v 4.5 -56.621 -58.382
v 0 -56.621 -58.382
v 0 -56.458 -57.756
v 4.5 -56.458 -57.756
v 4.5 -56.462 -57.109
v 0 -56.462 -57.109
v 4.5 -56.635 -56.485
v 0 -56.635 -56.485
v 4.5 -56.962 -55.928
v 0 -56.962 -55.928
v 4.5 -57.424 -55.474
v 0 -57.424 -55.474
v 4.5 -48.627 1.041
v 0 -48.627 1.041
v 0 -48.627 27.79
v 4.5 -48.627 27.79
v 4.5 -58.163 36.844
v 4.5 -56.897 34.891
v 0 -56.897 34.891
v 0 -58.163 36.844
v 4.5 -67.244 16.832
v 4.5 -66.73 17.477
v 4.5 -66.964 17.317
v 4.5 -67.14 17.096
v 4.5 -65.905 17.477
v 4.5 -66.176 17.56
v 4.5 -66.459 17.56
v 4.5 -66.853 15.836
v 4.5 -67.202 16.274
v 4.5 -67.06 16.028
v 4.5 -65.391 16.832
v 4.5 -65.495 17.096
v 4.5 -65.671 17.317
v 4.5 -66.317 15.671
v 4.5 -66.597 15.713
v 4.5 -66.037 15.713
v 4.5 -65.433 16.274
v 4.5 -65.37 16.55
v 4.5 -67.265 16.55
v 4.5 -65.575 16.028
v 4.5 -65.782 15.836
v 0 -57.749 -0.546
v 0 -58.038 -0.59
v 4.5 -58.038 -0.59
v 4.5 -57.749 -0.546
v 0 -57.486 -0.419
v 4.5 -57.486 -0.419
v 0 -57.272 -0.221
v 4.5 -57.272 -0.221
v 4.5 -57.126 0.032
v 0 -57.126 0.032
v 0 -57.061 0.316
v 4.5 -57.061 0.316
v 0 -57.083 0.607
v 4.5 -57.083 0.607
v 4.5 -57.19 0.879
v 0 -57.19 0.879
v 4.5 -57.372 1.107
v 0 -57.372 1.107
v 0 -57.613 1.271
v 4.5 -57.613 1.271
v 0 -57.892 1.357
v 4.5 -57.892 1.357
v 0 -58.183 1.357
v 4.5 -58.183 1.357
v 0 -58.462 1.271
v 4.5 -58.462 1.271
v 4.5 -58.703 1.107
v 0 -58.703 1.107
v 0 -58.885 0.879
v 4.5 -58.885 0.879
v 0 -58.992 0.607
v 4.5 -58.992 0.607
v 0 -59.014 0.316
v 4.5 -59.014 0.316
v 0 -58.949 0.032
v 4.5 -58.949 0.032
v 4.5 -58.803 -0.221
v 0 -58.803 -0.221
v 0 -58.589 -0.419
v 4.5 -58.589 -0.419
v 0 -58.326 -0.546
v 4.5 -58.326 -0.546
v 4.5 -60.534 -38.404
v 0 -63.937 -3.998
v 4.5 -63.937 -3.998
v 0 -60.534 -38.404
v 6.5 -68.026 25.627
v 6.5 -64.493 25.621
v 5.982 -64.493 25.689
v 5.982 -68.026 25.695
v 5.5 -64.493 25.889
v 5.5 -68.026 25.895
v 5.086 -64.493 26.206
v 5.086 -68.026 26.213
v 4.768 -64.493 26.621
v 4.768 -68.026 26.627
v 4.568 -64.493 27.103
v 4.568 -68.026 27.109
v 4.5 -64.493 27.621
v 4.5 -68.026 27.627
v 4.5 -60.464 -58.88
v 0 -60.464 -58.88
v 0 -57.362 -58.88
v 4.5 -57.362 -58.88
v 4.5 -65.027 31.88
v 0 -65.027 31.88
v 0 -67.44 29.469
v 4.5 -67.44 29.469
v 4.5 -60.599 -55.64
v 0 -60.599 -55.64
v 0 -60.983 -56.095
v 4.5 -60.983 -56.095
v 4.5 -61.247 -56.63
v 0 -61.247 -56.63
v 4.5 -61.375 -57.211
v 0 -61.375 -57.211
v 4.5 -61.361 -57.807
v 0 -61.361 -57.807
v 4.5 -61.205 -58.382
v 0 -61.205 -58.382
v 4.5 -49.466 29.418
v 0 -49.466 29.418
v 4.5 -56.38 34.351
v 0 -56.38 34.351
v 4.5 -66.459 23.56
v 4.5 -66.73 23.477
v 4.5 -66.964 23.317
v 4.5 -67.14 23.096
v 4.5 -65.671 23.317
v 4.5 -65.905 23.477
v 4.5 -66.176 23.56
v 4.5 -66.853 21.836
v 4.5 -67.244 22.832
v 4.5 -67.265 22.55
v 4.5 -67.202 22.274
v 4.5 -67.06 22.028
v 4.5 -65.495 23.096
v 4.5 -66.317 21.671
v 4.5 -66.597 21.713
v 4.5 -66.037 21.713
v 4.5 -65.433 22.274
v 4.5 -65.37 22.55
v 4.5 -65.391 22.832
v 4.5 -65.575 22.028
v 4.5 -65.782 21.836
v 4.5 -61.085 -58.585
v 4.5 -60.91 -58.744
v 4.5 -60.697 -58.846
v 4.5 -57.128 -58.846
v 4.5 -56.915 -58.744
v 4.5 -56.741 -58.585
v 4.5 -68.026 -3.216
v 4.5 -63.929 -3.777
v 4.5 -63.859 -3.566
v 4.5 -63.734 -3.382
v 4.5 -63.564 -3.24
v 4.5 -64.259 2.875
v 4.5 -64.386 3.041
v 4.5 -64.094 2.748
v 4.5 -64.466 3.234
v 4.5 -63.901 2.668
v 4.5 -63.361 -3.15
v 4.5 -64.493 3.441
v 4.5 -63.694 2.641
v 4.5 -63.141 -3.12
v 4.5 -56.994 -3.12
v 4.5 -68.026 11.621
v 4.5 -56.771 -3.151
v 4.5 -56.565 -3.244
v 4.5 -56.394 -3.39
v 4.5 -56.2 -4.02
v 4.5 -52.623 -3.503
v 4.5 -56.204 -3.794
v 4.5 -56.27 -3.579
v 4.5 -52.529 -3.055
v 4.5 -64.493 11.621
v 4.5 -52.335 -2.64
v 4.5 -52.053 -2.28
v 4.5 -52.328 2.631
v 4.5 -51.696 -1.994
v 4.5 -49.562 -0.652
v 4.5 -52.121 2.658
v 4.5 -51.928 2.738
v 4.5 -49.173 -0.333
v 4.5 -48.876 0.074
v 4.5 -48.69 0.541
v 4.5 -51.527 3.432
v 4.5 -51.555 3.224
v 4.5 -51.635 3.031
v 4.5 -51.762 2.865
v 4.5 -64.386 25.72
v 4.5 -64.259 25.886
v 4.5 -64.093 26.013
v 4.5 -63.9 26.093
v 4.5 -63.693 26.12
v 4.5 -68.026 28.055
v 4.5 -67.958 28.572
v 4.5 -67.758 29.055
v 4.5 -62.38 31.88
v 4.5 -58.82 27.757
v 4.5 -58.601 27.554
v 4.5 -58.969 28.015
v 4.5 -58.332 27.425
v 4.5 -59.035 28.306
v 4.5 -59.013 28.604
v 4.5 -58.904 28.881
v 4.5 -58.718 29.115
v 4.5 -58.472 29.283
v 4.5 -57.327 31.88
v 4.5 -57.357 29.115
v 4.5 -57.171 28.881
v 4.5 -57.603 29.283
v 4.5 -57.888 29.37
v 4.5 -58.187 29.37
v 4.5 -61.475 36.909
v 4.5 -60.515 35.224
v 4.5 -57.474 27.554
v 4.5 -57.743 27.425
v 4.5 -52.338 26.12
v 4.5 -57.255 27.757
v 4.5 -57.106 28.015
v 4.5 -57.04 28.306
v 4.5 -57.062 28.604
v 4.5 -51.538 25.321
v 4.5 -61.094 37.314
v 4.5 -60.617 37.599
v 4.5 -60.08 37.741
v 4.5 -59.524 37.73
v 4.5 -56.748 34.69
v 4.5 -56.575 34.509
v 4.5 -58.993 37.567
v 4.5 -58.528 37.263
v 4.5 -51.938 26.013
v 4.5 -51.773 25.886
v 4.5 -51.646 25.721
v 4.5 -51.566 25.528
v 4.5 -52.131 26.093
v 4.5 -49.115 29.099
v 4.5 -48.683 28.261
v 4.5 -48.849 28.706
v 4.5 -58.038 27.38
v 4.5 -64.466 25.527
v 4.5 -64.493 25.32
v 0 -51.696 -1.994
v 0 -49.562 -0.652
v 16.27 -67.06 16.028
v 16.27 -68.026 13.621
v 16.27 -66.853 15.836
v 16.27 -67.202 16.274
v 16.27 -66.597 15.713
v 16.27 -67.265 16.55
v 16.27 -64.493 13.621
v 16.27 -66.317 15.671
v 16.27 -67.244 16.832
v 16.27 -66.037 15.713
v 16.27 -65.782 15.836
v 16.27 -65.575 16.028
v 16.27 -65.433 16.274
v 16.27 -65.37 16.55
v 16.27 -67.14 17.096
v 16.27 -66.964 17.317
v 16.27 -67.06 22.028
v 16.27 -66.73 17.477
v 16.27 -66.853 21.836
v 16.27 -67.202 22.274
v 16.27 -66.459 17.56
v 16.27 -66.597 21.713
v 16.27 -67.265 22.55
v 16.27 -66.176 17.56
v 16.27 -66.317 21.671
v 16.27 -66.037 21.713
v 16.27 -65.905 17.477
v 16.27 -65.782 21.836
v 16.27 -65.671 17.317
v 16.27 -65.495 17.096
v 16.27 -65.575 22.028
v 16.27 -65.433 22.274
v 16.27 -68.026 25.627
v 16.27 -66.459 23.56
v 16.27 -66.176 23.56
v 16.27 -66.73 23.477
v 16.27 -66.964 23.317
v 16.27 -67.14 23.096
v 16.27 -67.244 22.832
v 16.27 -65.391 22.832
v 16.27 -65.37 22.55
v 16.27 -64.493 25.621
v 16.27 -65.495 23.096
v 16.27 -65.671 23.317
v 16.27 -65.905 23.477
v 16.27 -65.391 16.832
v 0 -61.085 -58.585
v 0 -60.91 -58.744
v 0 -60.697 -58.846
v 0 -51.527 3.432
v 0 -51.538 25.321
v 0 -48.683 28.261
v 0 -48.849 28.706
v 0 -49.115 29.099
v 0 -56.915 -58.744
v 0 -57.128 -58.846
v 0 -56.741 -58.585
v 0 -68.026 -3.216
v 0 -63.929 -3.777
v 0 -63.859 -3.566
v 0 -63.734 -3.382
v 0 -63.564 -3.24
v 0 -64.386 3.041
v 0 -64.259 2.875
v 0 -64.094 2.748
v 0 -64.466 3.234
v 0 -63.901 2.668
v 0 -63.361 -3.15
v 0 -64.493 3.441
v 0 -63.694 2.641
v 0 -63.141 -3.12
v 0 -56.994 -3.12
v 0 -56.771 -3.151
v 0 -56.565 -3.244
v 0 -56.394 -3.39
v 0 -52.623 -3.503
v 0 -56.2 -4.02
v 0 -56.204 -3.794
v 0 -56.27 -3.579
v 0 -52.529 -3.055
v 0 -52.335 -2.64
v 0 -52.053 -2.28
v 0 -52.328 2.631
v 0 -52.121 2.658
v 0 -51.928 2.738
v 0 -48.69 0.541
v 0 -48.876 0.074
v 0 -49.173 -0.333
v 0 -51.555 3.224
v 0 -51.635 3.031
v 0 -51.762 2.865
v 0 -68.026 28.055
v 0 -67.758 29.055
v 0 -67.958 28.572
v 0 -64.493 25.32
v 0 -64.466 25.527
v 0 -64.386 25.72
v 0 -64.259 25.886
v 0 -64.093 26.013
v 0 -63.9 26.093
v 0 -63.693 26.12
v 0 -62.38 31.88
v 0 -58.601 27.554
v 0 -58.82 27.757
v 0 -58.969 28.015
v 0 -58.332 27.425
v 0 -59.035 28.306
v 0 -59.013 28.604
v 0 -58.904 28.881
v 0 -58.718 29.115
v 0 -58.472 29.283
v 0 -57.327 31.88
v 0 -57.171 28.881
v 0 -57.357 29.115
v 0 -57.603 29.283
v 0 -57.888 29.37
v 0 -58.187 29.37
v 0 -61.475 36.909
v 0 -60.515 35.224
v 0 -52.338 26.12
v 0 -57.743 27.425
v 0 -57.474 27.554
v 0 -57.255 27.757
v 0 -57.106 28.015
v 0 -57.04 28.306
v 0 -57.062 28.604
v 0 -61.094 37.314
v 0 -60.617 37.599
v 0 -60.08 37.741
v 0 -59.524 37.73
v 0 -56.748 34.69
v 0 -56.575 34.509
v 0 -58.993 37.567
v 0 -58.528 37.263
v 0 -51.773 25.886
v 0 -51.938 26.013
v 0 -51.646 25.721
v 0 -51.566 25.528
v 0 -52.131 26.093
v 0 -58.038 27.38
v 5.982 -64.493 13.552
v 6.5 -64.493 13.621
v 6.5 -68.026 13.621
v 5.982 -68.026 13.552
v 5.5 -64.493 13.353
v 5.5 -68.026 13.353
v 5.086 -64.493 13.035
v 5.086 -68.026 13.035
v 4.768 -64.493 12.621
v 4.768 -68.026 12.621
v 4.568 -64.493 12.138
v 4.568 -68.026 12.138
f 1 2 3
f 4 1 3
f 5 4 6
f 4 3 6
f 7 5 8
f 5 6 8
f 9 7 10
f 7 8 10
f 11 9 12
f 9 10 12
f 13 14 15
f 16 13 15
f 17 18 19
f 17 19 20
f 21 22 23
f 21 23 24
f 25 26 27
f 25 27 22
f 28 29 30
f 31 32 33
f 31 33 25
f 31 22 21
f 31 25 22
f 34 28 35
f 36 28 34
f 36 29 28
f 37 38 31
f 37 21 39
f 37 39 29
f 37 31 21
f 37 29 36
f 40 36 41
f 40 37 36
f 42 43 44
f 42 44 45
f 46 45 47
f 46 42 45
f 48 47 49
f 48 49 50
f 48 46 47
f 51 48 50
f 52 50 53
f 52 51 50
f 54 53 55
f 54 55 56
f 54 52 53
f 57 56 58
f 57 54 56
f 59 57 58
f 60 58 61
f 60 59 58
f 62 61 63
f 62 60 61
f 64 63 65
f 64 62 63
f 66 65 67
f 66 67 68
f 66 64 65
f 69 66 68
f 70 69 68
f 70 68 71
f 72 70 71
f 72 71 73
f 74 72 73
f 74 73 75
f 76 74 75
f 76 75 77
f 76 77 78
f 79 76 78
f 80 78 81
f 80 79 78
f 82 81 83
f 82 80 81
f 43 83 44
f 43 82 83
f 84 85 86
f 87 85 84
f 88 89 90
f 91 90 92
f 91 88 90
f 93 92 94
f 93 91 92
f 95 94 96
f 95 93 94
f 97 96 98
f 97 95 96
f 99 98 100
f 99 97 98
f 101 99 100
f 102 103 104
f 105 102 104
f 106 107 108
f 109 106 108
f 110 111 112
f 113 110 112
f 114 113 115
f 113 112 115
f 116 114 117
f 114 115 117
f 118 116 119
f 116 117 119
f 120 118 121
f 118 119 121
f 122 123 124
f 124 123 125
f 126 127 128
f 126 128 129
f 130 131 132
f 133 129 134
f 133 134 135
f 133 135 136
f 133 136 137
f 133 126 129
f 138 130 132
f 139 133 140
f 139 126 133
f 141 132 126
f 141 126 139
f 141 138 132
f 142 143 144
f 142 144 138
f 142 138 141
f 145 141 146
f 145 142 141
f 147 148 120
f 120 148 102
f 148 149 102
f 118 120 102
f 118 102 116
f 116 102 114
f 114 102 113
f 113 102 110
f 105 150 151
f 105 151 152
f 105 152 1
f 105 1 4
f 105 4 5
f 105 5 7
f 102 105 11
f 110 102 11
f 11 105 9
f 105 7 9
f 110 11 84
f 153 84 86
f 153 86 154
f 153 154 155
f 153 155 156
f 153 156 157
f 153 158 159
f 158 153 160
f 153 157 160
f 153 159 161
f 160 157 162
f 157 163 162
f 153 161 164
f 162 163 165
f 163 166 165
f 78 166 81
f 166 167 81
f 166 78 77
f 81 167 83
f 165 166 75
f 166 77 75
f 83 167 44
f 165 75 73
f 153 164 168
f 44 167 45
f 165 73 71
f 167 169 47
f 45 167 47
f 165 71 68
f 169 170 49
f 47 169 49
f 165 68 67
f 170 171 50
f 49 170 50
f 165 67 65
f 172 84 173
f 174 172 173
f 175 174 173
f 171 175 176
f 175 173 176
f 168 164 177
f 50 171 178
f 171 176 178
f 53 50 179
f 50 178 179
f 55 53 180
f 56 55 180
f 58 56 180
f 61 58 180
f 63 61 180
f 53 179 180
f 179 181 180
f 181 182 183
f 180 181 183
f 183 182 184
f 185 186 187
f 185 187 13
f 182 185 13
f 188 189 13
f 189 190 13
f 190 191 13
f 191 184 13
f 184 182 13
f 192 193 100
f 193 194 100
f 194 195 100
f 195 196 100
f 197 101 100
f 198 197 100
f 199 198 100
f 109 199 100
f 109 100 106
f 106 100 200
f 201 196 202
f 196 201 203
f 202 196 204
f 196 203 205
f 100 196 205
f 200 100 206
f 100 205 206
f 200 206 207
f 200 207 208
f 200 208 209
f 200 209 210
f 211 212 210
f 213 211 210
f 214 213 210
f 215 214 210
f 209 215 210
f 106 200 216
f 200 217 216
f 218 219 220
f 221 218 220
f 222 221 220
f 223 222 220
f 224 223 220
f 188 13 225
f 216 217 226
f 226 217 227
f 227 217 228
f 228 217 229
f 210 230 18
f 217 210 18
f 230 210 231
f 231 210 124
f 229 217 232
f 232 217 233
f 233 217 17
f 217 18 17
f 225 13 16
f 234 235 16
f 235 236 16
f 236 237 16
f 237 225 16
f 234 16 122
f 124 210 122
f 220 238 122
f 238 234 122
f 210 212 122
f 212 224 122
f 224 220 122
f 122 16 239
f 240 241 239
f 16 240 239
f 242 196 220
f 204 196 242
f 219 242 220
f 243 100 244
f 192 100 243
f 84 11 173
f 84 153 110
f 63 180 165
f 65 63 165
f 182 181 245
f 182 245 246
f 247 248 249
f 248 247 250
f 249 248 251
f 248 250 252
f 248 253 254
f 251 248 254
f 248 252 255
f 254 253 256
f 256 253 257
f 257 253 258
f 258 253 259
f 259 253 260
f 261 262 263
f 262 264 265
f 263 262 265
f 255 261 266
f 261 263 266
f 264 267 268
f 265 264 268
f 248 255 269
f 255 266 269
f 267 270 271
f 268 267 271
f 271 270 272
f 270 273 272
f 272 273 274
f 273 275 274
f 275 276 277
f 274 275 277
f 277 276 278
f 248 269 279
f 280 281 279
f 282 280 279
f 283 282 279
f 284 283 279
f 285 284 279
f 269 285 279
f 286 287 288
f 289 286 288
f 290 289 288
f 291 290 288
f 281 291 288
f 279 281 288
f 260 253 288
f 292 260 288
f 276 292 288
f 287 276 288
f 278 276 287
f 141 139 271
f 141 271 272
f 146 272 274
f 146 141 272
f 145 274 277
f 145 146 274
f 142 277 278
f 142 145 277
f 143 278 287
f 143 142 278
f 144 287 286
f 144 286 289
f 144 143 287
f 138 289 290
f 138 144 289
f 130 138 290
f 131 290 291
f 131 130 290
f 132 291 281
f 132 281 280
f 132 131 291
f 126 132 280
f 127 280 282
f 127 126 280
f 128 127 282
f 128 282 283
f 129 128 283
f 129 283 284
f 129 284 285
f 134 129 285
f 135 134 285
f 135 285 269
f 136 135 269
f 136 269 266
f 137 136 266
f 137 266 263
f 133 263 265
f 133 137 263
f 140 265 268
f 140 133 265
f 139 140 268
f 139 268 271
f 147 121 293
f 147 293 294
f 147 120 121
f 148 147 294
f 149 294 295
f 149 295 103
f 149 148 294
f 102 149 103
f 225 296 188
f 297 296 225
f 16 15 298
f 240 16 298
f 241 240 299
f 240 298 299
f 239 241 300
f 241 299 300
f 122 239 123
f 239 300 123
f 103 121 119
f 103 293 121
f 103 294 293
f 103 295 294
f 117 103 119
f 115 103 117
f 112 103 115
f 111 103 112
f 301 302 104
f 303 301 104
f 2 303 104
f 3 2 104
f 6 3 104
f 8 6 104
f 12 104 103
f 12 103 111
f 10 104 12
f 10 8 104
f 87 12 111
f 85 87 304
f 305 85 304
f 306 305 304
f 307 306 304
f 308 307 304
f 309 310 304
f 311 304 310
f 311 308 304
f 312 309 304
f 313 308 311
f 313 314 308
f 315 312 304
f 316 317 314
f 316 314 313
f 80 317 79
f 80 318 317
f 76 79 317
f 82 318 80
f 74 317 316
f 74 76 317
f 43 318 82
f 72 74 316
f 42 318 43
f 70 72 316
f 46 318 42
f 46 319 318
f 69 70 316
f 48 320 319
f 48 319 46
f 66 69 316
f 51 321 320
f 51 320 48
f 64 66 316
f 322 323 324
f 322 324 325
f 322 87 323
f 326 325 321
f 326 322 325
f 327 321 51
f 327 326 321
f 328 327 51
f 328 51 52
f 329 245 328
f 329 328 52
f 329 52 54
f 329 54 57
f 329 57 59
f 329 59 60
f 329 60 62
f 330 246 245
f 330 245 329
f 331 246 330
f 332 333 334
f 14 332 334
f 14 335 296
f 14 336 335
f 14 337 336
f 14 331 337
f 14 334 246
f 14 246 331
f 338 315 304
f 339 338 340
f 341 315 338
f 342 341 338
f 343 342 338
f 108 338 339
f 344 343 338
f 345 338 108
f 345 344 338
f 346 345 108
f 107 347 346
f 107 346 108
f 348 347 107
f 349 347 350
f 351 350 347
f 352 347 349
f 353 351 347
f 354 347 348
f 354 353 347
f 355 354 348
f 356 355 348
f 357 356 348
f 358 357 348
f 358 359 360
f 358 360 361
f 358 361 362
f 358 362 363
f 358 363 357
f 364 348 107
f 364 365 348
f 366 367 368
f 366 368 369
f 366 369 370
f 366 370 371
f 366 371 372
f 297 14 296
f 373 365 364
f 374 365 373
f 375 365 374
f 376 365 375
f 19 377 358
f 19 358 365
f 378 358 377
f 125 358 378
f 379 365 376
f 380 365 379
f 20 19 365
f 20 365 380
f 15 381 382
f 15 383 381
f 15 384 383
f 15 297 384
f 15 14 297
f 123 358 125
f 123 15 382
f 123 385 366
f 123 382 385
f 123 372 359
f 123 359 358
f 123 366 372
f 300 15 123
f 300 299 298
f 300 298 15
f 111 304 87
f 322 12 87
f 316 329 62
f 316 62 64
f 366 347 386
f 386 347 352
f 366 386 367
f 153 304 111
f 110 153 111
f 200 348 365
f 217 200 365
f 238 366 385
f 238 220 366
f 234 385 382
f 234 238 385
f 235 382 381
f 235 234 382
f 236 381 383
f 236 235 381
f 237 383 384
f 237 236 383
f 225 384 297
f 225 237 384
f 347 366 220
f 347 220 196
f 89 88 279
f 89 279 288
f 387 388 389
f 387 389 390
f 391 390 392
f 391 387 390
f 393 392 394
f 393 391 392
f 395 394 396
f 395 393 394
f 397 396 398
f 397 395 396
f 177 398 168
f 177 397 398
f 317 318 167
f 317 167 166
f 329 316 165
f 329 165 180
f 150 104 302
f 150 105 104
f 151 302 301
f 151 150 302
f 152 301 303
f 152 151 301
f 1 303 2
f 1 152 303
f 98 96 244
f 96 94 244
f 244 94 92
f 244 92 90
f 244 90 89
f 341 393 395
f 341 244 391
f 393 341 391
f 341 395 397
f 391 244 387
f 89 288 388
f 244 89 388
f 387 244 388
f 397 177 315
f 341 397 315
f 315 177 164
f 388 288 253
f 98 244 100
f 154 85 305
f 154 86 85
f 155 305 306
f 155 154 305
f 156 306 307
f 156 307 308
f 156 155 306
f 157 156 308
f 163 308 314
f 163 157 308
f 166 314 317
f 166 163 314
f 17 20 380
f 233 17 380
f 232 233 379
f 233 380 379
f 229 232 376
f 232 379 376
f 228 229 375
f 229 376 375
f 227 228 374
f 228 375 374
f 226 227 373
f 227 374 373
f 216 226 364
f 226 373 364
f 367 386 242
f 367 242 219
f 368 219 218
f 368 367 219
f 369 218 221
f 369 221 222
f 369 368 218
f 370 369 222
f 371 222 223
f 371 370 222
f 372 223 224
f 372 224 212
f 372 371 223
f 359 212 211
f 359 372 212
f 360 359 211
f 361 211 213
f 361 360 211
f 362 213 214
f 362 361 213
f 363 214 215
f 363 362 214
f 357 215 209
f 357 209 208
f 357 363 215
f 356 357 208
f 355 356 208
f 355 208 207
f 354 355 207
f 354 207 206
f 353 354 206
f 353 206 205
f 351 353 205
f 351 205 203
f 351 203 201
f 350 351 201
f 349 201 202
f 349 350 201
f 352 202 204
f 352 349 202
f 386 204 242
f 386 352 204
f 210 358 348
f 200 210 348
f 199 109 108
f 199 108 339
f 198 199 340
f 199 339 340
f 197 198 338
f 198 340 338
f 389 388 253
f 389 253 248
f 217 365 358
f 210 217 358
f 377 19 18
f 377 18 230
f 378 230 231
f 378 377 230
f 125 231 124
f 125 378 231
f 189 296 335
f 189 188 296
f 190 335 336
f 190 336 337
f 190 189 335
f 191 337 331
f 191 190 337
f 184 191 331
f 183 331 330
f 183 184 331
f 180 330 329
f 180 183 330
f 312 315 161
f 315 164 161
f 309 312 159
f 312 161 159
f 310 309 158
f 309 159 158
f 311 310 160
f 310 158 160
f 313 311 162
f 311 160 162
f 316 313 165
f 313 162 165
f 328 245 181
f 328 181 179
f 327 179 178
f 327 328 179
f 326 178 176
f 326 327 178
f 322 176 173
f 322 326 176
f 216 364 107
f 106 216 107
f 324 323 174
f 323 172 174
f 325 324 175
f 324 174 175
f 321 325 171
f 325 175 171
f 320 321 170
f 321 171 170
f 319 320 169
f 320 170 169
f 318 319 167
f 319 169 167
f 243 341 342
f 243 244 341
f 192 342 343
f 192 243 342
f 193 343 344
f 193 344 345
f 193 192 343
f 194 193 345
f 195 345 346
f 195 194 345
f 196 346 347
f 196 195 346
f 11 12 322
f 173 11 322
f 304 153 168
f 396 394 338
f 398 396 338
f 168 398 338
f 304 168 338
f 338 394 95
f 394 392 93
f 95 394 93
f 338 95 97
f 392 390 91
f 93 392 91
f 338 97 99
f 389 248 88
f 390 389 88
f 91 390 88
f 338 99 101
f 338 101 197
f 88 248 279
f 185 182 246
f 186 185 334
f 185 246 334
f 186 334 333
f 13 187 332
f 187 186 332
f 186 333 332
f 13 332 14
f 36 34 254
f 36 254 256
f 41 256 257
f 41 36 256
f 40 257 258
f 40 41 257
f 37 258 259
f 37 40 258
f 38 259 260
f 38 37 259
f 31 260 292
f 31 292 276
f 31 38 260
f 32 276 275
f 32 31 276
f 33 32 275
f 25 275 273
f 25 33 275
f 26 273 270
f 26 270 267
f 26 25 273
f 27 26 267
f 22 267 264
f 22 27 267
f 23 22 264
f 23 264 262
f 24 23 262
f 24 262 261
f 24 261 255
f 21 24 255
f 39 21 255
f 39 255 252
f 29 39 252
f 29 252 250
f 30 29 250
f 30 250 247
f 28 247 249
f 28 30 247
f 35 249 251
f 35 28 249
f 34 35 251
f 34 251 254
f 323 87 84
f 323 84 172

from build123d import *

# Parameters (mm, degrees)
SKETCH_1_R      = 0.978970723
SKETCH_1_R_2    = 1.00064107
EXTRUDE_1_DEPTH = 4.5
SKETCH_2_R      = 0.95
EXTRUDE_2_DEPTH = 11.76992
FILLET_1_R      = 2
FILLET_2_R      = 0.8


with BuildPart() as part:
    # 草图1 → 凸台-拉伸1 (new body)
    with BuildSketch(Plane(origin=(0, 0, 0), x_dir=(0, 0, -1), z_dir=(1, 0, 0))):
        with BuildLine():
            Line((-39.321623093, -59.770803947), (-31.880209784, -65.026985305))
            Line((-31.880209784, -65.026985305), (-28.883499317, -68.026462319))
            Line((-28.883499317, -68.026462319), (3.215977086, -68.026462319))
            Line((3.215977086, -68.026462319), (55.639850151, -60.599346768))
            ThreePointArc((55.639850151, -60.599346768), (57.197718569, -61.373971566), (58.88034135, -60.931503307))
            Line((58.88034135, -60.931503307), (58.88034135, -56.894014776))
            ThreePointArc((58.88034135, -56.894014776), (57.069785986, -56.468040051), (55.474117274, -57.423763105))
            Line((55.474117274, -57.423763105), (2.519577321, -52.531922747))
            Line((2.519577321, -52.531922747), (0.064241127, -48.627089366))
            Line((0.064241127, -48.627089366), (-28.81990203, -48.627089366))
            Line((-28.81990203, -48.627089366), (-34.57208033, -56.689800145))
            Line((-34.57208033, -56.689800145), (-39.321623093, -59.770803947))
        make_face()
        with Locations((-0.389382662, -58.037544978)):
            Circle(SKETCH_1_R, mode=Mode.SUBTRACT)
        with Locations((-28.381009123, -58.037544978)):
            Circle(SKETCH_1_R_2, mode=Mode.SUBTRACT)
        Polygon((-26.120321367, -51.538768317), (-26.120321367, -64.493439573), (-2.641506603, -64.493439573), (-2.630422679, -51.527089366), align=None, mode=Mode.SUBTRACT)
        Polygon((3.119577321, -56.086889198), (3.119577321, -64.024429188), (38.403692816, -60.533510862), align=None, mode=Mode.SUBTRACT)
        Polygon((-31.880209784, -57.326749532), (-31.880422679, -62.379599563), (-35.223651542, -60.515120464), align=None, mode=Mode.SUBTRACT)
    extrude(amount=EXTRUDE_1_DEPTH)

    # 草图2 → 凸台-拉伸2 (add)
    with BuildSketch(Plane(origin=(4.5, 0, 0), x_dir=(0, 0, -1), z_dir=(1, 0, 0))):
        Polygon((-25.62686112, -68.026462319), (-25.620633929, -64.493439573), (-13.620633929, -64.493439573), (-13.620633929, -68.026462319), align=None)
        with Locations((-22.620633929, -66.317445767)):
            Circle(SKETCH_2_R, mode=Mode.SUBTRACT)
        with Locations((-16.620633929, -66.317445767)):
            Circle(SKETCH_2_R, mode=Mode.SUBTRACT)
    extrude(amount=EXTRUDE_2_DEPTH)

    # 圆角1
    # the kernel refuses this fillet: 2 mm, written as the material it adds along each edge
    with BuildSketch(Plane(origin=(0, -56.689800145, 34.57208033), x_dir=(0, -0.5442183706519984, 0.8389436006340856), z_dir=(1, 0, 0))) as fillet_1_piece_1:
        with BuildLine():
            CenterArc((FILLET_1_R * 0.19006878131, -FILLET_1_R), FILLET_1_R, 90, 21.523541221)
            Line((-FILLET_1_R * 0.176814696818, -FILLET_1_R * 0.0697330955707), (0, 0))
            Line((0, 0), (FILLET_1_R * 0.19006878131, 0))
        make_face()
    extrude(amount=4.5)
    with BuildSketch(Plane(origin=(0, -52.531922747, -2.519577321), x_dir=(0, -0.09198645148038477, -0.9957602586687455), z_dir=(1, 0, 0))) as fillet_1_piece_2:
        with BuildLine():
            CenterArc((FILLET_1_R * 0.493803738743, FILLET_1_R), FILLET_1_R, 217.439335715, 52.560664285)
            Line((-FILLET_1_R * 0.30019370817, FILLET_1_R * 0.392078907838), (0, 0))
            Line((0, 0), (FILLET_1_R * 0.493803738743, 0))
        make_face()
    extrude(amount=4.5)
    with BuildSketch(Plane(origin=(4.5, -64.493439573, 13.620633929), x_dir=(0, 0, -1), z_dir=(0, -1, 0))) as fillet_1_piece_3:
        with BuildLine():
            CenterArc((FILLET_1_R, FILLET_1_R), FILLET_1_R, 180, 90)
            Line((0, FILLET_1_R), (0, 0))
            Line((0, 0), (FILLET_1_R, 0))
        make_face()
    extrude(amount=3.533022746)
    with BuildSketch(Plane(origin=(4.5, -73.026454553, 25.635673944), x_dir=(0, 0.0017625646835904966, 0.9999984466816618), z_dir=(0, 0.9999984466816617, -0.0017625646835904966))) as fillet_1_piece_4_section:
        with BuildLine():
            CenterArc((FILLET_1_R, FILLET_1_R), FILLET_1_R, 180, 90)
            Line((0, FILLET_1_R), (0, 0))
            Line((0, 0), (FILLET_1_R, 0))
        make_face()
    fillet_1_piece_4 = extrude(amount=13.533028234, mode=Mode.PRIVATE)
    fillet_1_piece_4 = split(fillet_1_piece_4, bisect_by=Plane(origin=(4.696560989, -68.026462319, 26.482181103), z_dir=(0, 1, 0)), keep=Keep.TOP, mode=Mode.PRIVATE)
    fillet_1_piece_4 = split(fillet_1_piece_4, bisect_by=Plane(origin=(4.696560989, -64.493439573, 26.482181103), z_dir=(0, -1, 0)), keep=Keep.TOP, mode=Mode.PRIVATE)
    add(fillet_1_piece_4)
    # the kernel refuses this fillet: 2 mm, written as the material it takes off along each edge
    with BuildSketch(Plane(origin=(-2.574882543, -48.627089366, 28.81990203), x_dir=(0, 0, -1), z_dir=(1, 0, 0))) as fillet_1_2_piece_1:
        with BuildLine():
            CenterArc((FILLET_1_R * 0.514976508546, -FILLET_1_R), FILLET_1_R, 90, 54.49480721)
            Line((-FILLET_1_R * 0.299086376608, -FILLET_1_R * 0.419223262333), (0, 0))
            Line((0, 0), (FILLET_1_R * 0.514976508546, 0))
        make_face()
    extrude(amount=9.649765085, mode=Mode.SUBTRACT)
    with BuildSketch(Plane(origin=(-2.762343959, -48.627089366, -0.064241127), x_dir=(0, -0.8465516071687306, -0.532306656355187), z_dir=(1, 0, 0))) as fillet_1_2_piece_2:
        with BuildLine():
            CenterArc((FILLET_1_R * 0.552468791842, -FILLET_1_R), FILLET_1_R, 90, 57.83856081)
            Line((-FILLET_1_R * 0.294082815326, -FILLET_1_R * 0.467693343645), (0, 0))
            Line((0, 0), (FILLET_1_R * 0.552468791842, 0))
        make_face()
    extrude(amount=10.024687918, mode=Mode.SUBTRACT)
    with BuildSketch(Plane(origin=(-2.072419305, -68.026462319, 28.883499317), x_dir=(0, 0.7074329539484039, 0.70678045789894), z_dir=(1, 0, 0))) as fillet_1_2_piece_3:
        with BuildLine():
            CenterArc((FILLET_1_R * 0.414483860929, -FILLET_1_R), FILLET_1_R, 90, 45.026435379)
            Line((-FILLET_1_R * 0.292949093019, -FILLET_1_R * 0.293219542101), (0, 0))
            Line((0, 0), (FILLET_1_R * 0.414483860929, 0))
        make_face()
    extrude(amount=8.644838609, mode=Mode.SUBTRACT)
    with BuildSketch(Plane(origin=(-7.384077235, -59.770803947, 39.321623093), x_dir=(0, -0.5769336472143782, -0.816791017771324), z_dir=(1, 0, 0))) as fillet_1_2_piece_4:
        with BuildLine():
            CenterArc((FILLET_1_R * 1.47681544699, FILLET_1_R), FILLET_1_R, 158.206425449, 111.793574551)
            Line((FILLET_1_R * 0.548287978811, FILLET_1_R * 1.37126370795), (0, 0))
            Line((0, 0), (FILLET_1_R * 1.47681544699, 0))
        make_face()
    extrude(amount=19.26815447, mode=Mode.SUBTRACT)

    # 圆角2
    fillet_2_edges = [part.edges().sort_by_distance(p)[0] for p in [
        (2.25, -56.894014776, -58.88034135),
        (2.25, -60.931503307, -58.88034135),
        (2.25, -51.527089366, 2.630422679),
        (2.25, -51.538768317, 26.120321367),
        (2.25, -64.493439573, 26.120321367),
        (2.25, -64.493439573, 2.641506603),
        (2.25, -56.086889198, -3.119577321),
        (2.25, -64.024429188, -3.119577321),
    ]]
    fillet(fillet_2_edges, radius=FILLET_2_R)


solid = part.part
